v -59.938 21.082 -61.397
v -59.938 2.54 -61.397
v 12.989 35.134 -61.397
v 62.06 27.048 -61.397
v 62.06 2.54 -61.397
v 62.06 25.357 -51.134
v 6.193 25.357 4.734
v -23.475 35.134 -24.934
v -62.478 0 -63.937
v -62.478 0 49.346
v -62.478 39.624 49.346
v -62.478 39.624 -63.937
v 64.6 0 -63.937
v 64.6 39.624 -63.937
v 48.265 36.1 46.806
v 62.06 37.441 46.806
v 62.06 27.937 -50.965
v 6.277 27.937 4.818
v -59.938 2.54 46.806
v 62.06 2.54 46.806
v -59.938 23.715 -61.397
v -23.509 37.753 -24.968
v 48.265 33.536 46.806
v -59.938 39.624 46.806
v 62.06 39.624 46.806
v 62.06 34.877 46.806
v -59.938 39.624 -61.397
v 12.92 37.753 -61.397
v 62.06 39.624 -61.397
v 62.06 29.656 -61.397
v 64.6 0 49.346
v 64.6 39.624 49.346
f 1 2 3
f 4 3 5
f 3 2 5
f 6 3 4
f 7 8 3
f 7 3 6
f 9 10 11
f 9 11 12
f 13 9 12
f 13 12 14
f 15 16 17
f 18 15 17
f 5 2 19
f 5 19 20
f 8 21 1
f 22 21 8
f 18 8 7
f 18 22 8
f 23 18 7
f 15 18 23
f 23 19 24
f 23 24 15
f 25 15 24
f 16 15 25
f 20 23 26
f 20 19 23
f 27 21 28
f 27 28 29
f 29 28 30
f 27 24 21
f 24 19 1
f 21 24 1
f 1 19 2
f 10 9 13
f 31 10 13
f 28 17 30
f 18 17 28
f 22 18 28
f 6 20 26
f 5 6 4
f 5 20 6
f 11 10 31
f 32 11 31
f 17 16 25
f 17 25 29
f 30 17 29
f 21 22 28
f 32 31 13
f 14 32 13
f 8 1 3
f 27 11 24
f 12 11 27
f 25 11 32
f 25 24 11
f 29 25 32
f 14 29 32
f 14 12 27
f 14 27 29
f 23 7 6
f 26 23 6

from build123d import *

# Parameters (mm, degrees)
SKETCH1_W                  = 127.078191072
SKETCH1_H                  = 113.282646321
BOSS_EXTRUDE1_DEPTH        = 39.624
SHELL_1_T                  = -2.54
OFFICIAL_RIB_BLOCK20_REACH = 100.208


with BuildPart() as part:
    # Sketch1 → Boss-Extrude1 (new body)
    with BuildSketch(Plane(origin=(0, 0, 0), x_dir=(1, 0, 0), z_dir=(0, 1, 0))):
        with Locations((1.06119575, 7.295720781)):
            Rectangle(SKETCH1_W, SKETCH1_H)
    extrude(amount=BOSS_EXTRUDE1_DEPTH)

    # 抽壳1
    shell_1_openings = [part.faces().sort_by_distance(p)[0] for p in [
        (1.06119575, 39.624, -7.295720782),
    ]]
    offset(amount=SHELL_1_T, openings=shell_1_openings, kind=Kind.INTERSECTION)

    # 草图1 walls → official_rib_block20 (add, up to next)
    with BuildSketch(Plane(origin=(0.729572078, 0, -0.729572078), x_dir=(0.7071067811865477, 0, 0.7071067811865475), z_dir=(-0.7071067811865475, 0, 0.7071067811865477)), mode=Mode.PRIVATE) as official_rib_block20_sk1:
        Polygon((-181.514338156, -5.000960726), (-34.23, 35.134), (7.726, 25.357), (209.797270961, 53.134303954), (209.451367988, 55.650640802), (7.84521248, 27.93727297), (-34.278590113, 37.753375981), (-182.182137615, -2.550319201), align=None)
    official_rib_block20_tool1 = extrude(official_rib_block20_sk1.sketch, amount=-OFFICIAL_RIB_BLOCK20_REACH, mode=Mode.PRIVATE) - part.part
    add(official_rib_block20_tool1.solids().sort_by_distance((-8.641006986, 30.2455, -10.100151142))[0])


solid = part.part
